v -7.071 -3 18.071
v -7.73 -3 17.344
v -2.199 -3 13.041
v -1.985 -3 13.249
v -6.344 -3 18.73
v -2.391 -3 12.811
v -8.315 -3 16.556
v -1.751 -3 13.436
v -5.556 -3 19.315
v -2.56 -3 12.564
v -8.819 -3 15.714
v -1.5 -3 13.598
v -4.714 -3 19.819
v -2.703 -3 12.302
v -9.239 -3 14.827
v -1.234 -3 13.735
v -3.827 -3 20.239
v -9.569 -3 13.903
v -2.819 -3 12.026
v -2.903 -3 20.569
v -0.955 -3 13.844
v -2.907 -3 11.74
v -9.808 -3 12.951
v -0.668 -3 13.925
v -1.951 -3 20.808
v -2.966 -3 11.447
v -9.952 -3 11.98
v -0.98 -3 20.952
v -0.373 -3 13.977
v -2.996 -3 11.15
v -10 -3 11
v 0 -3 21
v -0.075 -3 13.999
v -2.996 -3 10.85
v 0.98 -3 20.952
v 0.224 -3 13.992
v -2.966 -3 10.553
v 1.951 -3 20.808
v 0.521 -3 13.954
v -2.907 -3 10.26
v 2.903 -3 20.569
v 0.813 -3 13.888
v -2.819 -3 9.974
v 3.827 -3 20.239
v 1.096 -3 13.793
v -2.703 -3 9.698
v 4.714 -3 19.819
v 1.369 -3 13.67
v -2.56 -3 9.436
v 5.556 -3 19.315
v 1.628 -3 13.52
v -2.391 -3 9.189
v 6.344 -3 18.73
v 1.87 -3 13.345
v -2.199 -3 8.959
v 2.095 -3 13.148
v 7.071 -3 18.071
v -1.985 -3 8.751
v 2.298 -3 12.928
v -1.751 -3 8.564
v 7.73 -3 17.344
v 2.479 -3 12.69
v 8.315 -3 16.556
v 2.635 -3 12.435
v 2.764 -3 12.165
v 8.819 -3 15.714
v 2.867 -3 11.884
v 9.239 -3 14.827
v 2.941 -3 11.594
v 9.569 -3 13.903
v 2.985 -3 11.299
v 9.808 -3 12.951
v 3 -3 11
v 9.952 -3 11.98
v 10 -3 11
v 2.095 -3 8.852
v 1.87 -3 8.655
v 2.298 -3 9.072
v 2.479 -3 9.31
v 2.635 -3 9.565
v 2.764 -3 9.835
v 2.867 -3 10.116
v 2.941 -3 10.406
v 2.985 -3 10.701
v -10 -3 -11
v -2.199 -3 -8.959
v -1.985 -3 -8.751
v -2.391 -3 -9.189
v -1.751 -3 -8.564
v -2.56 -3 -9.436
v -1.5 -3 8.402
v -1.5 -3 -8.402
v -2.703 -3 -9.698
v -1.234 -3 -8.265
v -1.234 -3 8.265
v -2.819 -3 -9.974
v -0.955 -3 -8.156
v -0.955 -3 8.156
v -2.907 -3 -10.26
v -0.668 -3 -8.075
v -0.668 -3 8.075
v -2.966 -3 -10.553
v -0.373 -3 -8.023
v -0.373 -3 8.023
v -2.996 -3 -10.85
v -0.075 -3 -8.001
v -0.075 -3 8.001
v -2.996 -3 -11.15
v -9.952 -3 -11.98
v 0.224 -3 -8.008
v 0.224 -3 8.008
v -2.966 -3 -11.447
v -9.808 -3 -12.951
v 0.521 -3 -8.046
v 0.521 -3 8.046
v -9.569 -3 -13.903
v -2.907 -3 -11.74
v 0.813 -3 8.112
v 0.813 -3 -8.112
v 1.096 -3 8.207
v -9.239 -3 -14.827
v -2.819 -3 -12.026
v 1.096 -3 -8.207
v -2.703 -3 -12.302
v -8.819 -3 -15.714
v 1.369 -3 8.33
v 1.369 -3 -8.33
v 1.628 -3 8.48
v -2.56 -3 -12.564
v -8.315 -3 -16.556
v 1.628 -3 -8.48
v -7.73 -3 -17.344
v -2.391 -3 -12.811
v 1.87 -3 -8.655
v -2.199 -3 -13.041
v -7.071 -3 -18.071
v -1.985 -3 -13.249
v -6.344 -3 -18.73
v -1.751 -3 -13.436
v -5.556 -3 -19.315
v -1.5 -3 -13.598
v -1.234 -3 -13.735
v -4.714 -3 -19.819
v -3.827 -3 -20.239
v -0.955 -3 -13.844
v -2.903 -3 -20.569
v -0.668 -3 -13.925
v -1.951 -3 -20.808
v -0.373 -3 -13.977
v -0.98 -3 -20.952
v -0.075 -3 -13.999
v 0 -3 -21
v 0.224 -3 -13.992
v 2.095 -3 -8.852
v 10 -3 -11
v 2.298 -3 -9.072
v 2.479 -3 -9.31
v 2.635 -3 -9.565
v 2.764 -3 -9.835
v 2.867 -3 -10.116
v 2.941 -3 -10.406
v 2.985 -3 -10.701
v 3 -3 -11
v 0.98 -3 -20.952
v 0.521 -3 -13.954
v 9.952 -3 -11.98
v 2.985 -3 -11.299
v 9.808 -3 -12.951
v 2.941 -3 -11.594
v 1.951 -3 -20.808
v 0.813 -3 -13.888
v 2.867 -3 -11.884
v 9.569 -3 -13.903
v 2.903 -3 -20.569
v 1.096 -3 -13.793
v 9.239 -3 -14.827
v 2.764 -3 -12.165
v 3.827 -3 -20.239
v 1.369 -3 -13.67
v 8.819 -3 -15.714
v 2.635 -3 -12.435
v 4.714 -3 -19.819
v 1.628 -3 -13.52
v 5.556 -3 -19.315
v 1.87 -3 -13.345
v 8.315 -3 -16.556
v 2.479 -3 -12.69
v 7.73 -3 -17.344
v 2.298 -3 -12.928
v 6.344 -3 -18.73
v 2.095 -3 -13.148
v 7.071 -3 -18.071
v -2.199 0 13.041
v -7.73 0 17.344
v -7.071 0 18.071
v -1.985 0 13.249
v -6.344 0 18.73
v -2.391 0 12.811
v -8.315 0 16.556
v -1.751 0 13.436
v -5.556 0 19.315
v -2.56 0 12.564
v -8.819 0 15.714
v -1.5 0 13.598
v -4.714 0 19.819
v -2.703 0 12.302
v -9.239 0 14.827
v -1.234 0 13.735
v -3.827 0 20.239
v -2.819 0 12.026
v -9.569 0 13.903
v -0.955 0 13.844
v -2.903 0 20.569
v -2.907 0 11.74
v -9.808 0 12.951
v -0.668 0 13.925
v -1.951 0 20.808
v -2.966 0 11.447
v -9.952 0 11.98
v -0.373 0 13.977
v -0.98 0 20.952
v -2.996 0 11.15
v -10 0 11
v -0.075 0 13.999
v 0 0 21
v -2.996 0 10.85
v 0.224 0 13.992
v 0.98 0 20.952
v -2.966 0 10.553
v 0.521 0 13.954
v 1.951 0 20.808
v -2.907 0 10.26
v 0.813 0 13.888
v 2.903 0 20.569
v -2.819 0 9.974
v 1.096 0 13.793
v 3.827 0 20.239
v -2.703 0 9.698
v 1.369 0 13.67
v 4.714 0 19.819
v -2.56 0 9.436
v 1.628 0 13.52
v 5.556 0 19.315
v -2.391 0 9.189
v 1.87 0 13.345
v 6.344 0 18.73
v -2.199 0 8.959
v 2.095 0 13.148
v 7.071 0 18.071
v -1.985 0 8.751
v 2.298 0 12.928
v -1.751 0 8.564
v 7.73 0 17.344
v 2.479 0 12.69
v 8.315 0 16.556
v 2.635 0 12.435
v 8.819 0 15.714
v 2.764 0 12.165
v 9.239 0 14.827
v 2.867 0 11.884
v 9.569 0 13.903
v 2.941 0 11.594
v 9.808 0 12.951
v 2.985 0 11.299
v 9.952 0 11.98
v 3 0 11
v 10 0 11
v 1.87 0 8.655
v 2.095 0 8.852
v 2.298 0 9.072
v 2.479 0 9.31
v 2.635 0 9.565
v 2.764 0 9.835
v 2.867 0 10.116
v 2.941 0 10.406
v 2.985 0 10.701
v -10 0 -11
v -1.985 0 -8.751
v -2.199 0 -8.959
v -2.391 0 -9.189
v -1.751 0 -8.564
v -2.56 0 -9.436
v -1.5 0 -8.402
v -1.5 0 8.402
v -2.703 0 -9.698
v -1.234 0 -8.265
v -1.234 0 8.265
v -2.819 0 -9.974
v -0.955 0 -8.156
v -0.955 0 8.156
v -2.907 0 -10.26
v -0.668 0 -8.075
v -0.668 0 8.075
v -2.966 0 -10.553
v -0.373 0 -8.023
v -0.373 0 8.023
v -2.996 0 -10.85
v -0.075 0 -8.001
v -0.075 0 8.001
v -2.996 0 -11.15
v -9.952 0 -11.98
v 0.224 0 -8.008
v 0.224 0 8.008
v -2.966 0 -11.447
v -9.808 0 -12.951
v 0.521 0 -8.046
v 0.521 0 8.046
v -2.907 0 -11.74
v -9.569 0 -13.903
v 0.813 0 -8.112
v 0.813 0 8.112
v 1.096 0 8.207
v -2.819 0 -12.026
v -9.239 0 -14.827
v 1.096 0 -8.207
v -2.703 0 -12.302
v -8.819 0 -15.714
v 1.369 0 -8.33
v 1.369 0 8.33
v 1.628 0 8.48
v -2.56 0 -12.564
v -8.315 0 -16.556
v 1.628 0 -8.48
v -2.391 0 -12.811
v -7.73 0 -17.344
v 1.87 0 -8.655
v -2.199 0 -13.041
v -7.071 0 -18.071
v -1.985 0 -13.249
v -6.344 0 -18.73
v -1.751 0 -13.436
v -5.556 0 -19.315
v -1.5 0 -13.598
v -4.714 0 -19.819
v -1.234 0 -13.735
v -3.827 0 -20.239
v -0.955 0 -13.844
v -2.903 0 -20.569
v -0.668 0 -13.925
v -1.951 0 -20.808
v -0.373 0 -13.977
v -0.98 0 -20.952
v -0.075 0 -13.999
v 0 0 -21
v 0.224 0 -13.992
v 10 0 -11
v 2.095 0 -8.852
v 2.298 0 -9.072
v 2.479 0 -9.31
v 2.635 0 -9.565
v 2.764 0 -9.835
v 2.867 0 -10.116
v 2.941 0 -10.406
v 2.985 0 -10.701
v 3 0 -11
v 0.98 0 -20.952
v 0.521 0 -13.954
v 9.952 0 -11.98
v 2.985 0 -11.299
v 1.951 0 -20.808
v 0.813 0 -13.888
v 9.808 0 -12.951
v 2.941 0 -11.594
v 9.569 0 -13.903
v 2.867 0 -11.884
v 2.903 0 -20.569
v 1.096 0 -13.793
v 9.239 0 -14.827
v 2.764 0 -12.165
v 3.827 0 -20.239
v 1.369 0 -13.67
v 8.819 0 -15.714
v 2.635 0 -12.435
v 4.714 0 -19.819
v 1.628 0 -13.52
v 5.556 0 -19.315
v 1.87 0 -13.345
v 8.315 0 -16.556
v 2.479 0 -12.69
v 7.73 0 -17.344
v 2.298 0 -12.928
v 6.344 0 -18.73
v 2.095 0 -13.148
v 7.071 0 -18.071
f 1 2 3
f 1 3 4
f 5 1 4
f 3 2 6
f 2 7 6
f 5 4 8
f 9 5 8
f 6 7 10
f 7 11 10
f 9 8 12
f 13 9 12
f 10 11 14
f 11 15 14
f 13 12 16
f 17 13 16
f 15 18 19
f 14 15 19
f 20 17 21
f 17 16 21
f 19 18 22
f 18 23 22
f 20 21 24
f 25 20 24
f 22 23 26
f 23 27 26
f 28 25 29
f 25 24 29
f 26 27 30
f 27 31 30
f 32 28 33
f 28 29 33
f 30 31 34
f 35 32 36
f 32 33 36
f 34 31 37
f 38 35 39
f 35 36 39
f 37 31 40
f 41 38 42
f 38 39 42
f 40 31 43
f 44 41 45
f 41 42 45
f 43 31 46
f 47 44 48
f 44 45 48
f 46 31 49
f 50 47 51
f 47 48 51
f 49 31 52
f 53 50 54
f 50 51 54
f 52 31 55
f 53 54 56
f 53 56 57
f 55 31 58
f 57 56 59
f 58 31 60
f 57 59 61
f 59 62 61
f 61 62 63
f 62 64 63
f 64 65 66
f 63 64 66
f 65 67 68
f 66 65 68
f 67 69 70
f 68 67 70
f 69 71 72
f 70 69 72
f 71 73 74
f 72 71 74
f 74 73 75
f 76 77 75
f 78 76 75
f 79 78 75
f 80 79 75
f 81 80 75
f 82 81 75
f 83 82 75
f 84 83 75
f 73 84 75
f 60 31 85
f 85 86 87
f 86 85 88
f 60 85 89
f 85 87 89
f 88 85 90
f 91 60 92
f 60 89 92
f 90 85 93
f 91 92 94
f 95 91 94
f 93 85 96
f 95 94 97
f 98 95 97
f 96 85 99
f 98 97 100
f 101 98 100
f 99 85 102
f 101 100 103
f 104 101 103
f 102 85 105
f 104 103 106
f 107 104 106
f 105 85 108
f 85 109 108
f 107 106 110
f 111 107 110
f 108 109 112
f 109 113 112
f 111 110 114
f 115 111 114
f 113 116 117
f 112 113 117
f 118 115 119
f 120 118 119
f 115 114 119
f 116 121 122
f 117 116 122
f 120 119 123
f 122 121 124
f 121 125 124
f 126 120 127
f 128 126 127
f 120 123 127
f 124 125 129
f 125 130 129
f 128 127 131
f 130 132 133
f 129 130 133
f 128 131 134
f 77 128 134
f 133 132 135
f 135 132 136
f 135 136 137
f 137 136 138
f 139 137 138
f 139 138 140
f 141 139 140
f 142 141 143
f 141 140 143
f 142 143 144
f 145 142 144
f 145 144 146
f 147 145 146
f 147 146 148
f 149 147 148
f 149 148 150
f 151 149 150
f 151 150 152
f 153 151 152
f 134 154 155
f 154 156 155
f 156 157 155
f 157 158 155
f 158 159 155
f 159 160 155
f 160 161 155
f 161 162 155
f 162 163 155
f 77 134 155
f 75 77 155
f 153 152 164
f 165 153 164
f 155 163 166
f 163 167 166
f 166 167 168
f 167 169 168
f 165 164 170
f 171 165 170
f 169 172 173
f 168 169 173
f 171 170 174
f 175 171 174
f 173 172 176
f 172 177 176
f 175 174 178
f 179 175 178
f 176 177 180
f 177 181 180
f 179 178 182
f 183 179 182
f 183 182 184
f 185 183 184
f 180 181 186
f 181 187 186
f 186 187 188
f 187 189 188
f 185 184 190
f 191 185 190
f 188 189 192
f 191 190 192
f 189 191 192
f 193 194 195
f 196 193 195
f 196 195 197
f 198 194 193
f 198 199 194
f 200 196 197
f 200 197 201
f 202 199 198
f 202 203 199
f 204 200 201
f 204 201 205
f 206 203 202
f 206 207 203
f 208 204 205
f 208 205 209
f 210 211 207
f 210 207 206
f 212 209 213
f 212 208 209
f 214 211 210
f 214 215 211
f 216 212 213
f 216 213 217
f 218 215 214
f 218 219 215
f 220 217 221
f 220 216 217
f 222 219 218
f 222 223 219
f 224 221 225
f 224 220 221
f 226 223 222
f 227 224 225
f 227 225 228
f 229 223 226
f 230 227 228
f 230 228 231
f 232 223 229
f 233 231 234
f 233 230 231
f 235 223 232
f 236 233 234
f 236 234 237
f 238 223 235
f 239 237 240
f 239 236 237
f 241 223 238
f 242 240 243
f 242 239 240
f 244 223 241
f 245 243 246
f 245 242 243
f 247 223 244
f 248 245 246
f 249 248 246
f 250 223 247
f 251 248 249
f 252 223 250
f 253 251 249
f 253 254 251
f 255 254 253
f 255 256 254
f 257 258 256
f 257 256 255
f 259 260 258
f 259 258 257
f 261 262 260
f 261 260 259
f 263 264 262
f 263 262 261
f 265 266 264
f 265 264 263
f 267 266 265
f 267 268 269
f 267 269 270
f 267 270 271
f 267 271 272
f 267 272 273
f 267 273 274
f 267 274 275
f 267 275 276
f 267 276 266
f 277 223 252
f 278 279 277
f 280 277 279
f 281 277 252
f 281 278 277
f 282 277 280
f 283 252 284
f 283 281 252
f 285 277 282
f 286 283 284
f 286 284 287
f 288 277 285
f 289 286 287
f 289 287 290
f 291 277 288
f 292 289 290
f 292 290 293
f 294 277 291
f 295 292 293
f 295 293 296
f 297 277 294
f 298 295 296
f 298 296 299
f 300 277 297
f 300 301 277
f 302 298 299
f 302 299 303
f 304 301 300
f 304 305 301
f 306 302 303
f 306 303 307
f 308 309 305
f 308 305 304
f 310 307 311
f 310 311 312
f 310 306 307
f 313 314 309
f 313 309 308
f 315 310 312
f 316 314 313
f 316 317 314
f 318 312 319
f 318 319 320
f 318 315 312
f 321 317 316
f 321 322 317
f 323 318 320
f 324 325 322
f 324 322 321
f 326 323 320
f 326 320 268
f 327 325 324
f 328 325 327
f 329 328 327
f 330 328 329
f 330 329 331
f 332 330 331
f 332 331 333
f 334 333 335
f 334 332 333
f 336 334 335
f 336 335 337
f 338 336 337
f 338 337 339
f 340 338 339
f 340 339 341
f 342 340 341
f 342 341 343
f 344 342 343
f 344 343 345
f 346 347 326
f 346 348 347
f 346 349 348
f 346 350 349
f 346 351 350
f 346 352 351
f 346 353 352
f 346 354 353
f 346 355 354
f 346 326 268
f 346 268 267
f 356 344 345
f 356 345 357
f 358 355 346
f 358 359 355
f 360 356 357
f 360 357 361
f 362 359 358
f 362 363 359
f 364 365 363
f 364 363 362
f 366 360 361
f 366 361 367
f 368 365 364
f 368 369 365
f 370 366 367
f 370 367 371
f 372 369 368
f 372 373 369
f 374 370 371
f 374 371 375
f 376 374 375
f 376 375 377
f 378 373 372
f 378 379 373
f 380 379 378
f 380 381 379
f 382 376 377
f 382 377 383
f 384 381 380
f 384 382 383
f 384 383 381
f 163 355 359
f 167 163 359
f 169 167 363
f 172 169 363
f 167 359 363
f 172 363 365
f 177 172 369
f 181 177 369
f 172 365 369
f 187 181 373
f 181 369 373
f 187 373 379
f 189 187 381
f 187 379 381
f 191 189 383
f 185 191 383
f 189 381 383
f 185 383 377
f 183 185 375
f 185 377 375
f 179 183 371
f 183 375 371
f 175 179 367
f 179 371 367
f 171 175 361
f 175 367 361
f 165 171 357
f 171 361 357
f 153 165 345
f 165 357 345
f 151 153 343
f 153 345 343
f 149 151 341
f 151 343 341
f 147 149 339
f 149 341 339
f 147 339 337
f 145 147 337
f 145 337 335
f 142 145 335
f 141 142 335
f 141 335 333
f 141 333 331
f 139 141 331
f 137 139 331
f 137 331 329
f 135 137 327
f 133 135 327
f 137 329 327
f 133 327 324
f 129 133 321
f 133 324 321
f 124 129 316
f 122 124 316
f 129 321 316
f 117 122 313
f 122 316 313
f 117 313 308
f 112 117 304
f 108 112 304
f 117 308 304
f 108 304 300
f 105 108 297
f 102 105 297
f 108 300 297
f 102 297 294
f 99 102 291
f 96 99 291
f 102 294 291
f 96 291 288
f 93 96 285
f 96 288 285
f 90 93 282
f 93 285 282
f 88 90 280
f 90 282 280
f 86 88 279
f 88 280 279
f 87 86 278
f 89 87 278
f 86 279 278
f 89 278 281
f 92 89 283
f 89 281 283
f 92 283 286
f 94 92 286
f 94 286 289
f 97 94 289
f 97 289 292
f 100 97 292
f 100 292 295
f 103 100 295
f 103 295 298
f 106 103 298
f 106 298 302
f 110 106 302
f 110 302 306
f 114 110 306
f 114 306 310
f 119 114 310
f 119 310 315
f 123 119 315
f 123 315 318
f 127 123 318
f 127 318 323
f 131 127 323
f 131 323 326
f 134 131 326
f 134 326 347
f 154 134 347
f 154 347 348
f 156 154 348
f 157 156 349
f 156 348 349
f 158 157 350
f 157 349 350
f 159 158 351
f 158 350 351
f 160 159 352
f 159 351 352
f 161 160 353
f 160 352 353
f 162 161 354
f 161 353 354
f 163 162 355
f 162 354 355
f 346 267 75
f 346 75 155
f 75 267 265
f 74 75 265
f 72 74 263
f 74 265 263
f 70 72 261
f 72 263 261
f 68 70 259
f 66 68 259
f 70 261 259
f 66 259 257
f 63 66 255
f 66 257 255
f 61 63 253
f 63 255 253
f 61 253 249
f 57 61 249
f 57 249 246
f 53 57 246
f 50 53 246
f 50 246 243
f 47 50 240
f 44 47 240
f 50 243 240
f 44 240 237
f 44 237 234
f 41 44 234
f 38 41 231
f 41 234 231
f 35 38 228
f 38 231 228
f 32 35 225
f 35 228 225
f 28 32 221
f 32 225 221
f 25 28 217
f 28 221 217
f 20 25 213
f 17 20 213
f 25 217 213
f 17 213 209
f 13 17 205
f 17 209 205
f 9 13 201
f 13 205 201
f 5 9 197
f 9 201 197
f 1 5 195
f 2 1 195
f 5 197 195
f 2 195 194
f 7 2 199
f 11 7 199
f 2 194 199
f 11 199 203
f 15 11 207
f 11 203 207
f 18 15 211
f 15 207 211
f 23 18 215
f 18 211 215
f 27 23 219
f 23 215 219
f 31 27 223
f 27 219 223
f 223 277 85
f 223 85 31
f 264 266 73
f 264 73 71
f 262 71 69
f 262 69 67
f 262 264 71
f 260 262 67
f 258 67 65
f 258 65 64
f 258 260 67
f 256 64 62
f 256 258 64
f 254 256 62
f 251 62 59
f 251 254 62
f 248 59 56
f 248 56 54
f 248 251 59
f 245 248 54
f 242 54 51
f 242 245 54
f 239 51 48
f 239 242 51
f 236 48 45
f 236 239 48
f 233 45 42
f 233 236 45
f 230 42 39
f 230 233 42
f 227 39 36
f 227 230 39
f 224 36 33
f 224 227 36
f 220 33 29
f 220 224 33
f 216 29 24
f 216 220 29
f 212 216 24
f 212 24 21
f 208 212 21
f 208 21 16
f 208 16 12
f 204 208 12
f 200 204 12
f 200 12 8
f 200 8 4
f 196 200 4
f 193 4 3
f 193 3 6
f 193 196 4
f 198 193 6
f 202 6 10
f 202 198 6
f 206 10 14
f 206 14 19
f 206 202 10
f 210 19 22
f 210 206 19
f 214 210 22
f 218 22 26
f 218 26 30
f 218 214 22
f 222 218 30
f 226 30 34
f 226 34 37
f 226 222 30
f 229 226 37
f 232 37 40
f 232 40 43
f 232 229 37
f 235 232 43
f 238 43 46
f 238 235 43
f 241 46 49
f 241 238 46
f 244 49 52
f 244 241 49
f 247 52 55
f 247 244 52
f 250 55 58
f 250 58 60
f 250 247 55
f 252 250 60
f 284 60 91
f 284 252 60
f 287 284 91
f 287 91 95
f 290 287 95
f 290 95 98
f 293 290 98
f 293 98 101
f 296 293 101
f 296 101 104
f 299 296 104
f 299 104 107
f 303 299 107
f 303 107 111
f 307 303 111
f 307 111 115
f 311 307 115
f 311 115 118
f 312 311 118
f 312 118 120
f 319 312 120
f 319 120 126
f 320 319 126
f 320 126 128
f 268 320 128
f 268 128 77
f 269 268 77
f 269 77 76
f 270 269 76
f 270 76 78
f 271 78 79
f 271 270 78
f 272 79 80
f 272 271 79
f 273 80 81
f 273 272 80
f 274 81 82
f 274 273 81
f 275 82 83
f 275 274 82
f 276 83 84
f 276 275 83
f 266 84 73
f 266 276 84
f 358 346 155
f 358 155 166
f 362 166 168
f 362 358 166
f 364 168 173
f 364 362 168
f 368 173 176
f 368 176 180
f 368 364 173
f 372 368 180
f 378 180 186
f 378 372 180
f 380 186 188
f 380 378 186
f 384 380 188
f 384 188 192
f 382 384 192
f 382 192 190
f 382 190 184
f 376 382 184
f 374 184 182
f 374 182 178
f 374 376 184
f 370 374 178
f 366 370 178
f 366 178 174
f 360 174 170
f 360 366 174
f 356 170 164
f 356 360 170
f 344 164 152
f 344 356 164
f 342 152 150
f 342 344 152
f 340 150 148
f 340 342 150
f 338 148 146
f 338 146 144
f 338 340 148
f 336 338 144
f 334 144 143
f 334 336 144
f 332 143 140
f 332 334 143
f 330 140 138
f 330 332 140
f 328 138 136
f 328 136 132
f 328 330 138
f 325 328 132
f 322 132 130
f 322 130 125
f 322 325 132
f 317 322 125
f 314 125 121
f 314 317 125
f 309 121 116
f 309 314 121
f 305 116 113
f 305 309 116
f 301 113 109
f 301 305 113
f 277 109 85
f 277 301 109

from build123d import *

# Parameters (mm, degrees)
F0_R     = 3
F1_DEPTH = 3


with BuildPart() as f1:
    # F0 (on Front) → F1 (new body)
    with BuildSketch(Plane.XZ):
        with BuildLine():
            Line((10, 0), (10, 11))
            ThreePointArc((10, 11), (0, 1), (-10, 11))
            Line((-10, 11), (-10, 0))
            Line((-10, 0), (10, 0))
        make_face()
        with BuildLine():
            ThreePointArc((-10, 11), (0, 1), (10, 11))
            ThreePointArc((10, 11), (0, 21), (-10, 11))
        make_face()
        with Locations((0, 11)):
            Circle(F0_R, mode=Mode.SUBTRACT)
    extrude(amount=F1_DEPTH)

    # F2: F1 across face


with BuildPart() as f1_1:
    add(f1.part)
    add(f1.part.mirror(Plane(origin=(0, -1.5, 0), x_dir=(1, 0, 0), z_dir=(0, 0, -1))))


solid = f1_1.part
